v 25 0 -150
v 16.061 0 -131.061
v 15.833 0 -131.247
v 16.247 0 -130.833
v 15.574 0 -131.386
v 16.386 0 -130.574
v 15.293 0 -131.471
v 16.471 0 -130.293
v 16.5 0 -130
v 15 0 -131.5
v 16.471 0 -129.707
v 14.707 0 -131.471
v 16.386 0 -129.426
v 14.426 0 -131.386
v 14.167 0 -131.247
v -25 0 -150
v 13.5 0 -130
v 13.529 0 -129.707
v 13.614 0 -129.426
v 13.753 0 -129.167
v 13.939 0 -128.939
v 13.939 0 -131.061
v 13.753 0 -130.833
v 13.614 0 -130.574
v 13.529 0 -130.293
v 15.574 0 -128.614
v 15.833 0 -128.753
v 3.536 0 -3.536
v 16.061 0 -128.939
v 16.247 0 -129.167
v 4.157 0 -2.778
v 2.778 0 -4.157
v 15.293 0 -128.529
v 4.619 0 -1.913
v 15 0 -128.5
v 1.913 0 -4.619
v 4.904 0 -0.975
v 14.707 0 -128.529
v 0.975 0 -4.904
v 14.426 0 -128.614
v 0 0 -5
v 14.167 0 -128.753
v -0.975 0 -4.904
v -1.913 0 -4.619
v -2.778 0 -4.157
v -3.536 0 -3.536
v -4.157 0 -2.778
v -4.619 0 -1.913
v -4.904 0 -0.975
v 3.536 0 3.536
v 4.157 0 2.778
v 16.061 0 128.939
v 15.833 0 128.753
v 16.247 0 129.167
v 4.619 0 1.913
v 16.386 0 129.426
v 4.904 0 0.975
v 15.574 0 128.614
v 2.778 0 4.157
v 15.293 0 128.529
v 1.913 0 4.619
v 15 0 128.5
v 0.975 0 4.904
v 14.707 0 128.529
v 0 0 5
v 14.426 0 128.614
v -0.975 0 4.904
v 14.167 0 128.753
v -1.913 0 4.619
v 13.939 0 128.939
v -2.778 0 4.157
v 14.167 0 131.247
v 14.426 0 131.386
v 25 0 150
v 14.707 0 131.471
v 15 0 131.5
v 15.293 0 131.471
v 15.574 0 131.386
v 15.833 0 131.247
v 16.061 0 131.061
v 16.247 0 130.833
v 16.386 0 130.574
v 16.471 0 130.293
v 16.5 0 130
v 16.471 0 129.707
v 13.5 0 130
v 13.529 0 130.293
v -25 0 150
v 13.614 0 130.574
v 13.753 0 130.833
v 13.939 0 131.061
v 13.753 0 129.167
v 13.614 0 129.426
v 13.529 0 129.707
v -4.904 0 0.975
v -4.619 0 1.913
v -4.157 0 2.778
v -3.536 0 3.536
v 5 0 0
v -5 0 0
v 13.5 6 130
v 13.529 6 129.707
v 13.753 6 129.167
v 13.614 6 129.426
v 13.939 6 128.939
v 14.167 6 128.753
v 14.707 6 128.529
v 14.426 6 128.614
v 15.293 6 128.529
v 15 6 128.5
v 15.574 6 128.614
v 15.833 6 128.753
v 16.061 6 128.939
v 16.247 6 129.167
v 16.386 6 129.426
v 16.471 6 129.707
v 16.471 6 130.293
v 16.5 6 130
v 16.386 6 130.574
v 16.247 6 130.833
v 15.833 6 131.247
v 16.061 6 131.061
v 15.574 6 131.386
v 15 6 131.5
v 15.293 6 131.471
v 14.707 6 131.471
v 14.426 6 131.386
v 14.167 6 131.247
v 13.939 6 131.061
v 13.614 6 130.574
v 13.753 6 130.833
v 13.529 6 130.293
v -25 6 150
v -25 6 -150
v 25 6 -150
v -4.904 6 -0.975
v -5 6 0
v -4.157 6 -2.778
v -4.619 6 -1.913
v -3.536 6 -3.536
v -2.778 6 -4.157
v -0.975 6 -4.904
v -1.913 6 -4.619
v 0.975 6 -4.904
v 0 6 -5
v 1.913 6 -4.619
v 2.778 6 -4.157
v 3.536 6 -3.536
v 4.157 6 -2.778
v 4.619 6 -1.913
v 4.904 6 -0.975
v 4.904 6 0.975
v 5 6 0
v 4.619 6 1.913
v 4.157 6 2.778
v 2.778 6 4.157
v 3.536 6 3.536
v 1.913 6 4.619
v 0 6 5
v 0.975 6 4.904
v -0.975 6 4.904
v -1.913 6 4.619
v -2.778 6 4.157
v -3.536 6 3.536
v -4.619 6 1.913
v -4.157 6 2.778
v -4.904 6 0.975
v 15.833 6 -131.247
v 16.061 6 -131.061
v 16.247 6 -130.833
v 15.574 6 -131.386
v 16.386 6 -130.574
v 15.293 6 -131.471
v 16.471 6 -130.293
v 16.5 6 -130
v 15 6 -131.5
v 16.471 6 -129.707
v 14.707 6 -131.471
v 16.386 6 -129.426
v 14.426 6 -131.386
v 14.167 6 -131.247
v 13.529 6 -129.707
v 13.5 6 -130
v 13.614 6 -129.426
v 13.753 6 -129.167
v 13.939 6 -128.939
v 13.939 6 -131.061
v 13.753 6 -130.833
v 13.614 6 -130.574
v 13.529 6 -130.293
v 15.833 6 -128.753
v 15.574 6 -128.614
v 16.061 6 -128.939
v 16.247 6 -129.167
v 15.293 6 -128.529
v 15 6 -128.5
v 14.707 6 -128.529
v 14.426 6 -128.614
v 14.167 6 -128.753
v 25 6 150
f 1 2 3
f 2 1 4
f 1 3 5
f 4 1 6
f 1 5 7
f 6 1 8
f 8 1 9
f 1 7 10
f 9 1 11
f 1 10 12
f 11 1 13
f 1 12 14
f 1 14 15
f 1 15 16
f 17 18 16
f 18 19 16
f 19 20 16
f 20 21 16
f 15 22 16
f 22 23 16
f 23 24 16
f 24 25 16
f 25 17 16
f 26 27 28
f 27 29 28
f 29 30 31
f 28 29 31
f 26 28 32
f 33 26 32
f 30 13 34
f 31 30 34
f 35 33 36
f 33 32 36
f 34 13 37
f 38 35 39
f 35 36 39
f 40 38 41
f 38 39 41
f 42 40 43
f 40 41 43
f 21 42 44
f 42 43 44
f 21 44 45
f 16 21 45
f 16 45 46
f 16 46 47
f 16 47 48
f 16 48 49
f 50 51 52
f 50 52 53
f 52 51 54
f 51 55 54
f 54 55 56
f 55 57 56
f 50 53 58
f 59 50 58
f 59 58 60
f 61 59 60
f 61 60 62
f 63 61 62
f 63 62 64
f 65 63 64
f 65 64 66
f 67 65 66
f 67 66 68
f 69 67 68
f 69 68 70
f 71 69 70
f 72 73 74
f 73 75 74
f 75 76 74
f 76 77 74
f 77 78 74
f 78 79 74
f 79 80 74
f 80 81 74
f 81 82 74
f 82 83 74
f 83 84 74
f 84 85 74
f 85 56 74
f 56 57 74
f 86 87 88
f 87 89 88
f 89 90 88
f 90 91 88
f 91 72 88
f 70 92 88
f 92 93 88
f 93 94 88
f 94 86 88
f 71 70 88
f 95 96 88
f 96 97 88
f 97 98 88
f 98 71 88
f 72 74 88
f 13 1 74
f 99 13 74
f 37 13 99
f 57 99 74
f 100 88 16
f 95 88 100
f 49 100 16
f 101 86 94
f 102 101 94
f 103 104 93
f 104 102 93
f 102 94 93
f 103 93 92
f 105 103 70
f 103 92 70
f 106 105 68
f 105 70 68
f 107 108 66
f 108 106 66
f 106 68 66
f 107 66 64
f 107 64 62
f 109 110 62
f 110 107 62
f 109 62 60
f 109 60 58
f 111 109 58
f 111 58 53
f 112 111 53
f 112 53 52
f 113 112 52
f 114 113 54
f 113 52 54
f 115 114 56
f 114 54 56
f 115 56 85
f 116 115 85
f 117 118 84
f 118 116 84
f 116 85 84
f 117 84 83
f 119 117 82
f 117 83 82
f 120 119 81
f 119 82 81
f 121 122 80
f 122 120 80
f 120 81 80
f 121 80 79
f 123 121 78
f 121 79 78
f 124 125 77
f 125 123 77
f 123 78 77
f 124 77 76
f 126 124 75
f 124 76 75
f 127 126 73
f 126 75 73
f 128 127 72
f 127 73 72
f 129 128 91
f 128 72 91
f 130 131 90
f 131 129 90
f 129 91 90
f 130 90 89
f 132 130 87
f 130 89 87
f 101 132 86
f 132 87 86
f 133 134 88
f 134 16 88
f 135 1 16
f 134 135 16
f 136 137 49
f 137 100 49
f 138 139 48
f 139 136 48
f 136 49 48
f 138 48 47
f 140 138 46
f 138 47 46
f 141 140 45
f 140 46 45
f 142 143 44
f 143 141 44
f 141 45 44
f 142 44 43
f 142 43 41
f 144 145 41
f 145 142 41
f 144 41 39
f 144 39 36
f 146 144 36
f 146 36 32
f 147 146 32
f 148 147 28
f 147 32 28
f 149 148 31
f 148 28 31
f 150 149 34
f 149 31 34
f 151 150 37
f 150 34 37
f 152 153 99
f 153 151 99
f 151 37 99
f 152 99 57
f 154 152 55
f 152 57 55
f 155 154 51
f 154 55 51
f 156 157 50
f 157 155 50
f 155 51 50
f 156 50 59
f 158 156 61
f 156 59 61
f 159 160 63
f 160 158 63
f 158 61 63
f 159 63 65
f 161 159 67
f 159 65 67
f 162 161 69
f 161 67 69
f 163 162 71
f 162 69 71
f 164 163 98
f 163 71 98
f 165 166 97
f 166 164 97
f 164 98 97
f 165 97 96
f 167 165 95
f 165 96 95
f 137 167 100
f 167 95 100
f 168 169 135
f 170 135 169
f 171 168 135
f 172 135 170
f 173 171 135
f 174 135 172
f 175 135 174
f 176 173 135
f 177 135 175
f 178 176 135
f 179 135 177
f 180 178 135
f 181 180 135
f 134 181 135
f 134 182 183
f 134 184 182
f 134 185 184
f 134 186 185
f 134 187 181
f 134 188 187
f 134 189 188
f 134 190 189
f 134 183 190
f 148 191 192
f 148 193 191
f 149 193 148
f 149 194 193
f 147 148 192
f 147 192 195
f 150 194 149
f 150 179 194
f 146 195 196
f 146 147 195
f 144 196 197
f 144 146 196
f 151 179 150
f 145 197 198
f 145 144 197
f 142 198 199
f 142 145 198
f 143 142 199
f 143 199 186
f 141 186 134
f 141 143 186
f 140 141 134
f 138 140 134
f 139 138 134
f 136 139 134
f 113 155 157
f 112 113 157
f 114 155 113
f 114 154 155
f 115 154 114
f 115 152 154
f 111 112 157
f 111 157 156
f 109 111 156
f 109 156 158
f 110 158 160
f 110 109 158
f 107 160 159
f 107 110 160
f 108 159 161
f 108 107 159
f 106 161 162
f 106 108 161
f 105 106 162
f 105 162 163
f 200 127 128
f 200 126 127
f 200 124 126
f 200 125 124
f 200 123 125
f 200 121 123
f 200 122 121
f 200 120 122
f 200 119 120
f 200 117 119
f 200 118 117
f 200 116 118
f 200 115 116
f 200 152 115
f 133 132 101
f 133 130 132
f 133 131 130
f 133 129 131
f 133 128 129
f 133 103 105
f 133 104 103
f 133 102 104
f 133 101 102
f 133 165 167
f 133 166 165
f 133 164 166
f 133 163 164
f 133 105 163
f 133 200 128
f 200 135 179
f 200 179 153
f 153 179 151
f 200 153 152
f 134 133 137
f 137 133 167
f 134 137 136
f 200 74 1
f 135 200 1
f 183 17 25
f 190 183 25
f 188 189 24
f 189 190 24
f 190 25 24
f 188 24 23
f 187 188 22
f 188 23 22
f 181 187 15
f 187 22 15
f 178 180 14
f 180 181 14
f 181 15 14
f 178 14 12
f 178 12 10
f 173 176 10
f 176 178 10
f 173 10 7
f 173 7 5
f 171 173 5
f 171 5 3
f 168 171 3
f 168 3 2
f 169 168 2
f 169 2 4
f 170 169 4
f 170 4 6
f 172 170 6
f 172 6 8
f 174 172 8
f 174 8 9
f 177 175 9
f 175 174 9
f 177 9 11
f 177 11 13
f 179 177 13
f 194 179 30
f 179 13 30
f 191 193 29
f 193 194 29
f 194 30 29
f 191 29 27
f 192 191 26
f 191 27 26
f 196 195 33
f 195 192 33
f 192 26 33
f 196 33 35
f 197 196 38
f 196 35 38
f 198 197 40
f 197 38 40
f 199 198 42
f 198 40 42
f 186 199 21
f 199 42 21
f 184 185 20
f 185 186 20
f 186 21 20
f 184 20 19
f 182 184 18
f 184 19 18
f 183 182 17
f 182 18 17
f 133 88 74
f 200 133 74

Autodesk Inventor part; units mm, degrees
ref_plane "YZ Plane" through (0, 0, 0) normal (1, 0, 0) x (0, 1, 0)
ref_plane "XZ Plane" through (0, 0, 0) normal (0, 1, 0) x (-1, 0, 0)
ref_plane "XY Plane" through (0, 0, 0) normal (0, 0, 1) x (1, 0, 0)
sketch "Sketch1" plane through (0, 0, 0) normal (0, 1, 0) x (-1, 0, 0)
  circle A0 centre (0, 0) radius 5
  line L0 (25, 150) -> (-25, 150)
  line L1 (-25, 150) -> (-25, -150)
  line L2 (-25, -150) -> (25, -150)
  line L3 (25, -150) -> (25, 150)
  line L4 (25, 150) -> (-25, -150) construction
  line L5 (-25, 150) -> (25, -150) construction
  circle A1 centre (-15, 130) radius 1.5
  circle A2 centre (-15, -130) radius 1.5
  dimension "d0" = 10
  dimension "d6" = 50
  dimension "d7" = 300
  dimension "d15" = 3
  dimension "d16" = 10
  dimension "d17" = 3
  dimension "d20" = 20
  dimension "d21" = 20
extrude "Extrusion2" add sketch "Sketch1" along normal blind 6
equation "\"d21\" = d20"
properties part number "Estabilizador"
